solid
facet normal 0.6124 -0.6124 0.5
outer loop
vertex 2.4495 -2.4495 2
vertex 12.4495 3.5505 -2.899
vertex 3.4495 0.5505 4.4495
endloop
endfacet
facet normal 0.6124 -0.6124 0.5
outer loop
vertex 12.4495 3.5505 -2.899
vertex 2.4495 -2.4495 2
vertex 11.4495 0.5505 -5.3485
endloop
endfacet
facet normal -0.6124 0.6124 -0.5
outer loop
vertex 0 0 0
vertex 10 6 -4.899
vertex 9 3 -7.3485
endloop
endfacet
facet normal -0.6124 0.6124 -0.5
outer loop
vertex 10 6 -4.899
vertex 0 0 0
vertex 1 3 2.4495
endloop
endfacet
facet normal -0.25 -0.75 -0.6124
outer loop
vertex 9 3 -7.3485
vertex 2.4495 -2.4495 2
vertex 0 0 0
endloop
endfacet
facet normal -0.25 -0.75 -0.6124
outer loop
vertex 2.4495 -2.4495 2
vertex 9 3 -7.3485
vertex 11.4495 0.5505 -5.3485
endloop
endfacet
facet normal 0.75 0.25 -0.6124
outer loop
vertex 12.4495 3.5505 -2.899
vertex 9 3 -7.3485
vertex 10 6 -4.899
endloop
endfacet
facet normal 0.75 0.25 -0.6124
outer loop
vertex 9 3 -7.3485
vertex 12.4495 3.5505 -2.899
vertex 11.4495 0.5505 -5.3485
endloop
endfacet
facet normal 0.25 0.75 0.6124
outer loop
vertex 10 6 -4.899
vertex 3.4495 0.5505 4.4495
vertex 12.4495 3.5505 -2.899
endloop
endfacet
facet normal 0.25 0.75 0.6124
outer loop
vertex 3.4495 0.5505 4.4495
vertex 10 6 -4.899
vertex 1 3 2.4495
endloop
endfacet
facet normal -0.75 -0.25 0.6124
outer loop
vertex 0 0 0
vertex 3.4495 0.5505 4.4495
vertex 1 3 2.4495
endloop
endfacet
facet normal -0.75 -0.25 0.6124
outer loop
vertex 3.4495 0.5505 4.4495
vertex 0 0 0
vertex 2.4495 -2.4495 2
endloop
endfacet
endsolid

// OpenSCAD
// Construct: rotate() about an arbitrary axis (a=angle, v=axis).
rotate(a = 60, v = [1, 1, 0]) cube([12, 4, 4]);
